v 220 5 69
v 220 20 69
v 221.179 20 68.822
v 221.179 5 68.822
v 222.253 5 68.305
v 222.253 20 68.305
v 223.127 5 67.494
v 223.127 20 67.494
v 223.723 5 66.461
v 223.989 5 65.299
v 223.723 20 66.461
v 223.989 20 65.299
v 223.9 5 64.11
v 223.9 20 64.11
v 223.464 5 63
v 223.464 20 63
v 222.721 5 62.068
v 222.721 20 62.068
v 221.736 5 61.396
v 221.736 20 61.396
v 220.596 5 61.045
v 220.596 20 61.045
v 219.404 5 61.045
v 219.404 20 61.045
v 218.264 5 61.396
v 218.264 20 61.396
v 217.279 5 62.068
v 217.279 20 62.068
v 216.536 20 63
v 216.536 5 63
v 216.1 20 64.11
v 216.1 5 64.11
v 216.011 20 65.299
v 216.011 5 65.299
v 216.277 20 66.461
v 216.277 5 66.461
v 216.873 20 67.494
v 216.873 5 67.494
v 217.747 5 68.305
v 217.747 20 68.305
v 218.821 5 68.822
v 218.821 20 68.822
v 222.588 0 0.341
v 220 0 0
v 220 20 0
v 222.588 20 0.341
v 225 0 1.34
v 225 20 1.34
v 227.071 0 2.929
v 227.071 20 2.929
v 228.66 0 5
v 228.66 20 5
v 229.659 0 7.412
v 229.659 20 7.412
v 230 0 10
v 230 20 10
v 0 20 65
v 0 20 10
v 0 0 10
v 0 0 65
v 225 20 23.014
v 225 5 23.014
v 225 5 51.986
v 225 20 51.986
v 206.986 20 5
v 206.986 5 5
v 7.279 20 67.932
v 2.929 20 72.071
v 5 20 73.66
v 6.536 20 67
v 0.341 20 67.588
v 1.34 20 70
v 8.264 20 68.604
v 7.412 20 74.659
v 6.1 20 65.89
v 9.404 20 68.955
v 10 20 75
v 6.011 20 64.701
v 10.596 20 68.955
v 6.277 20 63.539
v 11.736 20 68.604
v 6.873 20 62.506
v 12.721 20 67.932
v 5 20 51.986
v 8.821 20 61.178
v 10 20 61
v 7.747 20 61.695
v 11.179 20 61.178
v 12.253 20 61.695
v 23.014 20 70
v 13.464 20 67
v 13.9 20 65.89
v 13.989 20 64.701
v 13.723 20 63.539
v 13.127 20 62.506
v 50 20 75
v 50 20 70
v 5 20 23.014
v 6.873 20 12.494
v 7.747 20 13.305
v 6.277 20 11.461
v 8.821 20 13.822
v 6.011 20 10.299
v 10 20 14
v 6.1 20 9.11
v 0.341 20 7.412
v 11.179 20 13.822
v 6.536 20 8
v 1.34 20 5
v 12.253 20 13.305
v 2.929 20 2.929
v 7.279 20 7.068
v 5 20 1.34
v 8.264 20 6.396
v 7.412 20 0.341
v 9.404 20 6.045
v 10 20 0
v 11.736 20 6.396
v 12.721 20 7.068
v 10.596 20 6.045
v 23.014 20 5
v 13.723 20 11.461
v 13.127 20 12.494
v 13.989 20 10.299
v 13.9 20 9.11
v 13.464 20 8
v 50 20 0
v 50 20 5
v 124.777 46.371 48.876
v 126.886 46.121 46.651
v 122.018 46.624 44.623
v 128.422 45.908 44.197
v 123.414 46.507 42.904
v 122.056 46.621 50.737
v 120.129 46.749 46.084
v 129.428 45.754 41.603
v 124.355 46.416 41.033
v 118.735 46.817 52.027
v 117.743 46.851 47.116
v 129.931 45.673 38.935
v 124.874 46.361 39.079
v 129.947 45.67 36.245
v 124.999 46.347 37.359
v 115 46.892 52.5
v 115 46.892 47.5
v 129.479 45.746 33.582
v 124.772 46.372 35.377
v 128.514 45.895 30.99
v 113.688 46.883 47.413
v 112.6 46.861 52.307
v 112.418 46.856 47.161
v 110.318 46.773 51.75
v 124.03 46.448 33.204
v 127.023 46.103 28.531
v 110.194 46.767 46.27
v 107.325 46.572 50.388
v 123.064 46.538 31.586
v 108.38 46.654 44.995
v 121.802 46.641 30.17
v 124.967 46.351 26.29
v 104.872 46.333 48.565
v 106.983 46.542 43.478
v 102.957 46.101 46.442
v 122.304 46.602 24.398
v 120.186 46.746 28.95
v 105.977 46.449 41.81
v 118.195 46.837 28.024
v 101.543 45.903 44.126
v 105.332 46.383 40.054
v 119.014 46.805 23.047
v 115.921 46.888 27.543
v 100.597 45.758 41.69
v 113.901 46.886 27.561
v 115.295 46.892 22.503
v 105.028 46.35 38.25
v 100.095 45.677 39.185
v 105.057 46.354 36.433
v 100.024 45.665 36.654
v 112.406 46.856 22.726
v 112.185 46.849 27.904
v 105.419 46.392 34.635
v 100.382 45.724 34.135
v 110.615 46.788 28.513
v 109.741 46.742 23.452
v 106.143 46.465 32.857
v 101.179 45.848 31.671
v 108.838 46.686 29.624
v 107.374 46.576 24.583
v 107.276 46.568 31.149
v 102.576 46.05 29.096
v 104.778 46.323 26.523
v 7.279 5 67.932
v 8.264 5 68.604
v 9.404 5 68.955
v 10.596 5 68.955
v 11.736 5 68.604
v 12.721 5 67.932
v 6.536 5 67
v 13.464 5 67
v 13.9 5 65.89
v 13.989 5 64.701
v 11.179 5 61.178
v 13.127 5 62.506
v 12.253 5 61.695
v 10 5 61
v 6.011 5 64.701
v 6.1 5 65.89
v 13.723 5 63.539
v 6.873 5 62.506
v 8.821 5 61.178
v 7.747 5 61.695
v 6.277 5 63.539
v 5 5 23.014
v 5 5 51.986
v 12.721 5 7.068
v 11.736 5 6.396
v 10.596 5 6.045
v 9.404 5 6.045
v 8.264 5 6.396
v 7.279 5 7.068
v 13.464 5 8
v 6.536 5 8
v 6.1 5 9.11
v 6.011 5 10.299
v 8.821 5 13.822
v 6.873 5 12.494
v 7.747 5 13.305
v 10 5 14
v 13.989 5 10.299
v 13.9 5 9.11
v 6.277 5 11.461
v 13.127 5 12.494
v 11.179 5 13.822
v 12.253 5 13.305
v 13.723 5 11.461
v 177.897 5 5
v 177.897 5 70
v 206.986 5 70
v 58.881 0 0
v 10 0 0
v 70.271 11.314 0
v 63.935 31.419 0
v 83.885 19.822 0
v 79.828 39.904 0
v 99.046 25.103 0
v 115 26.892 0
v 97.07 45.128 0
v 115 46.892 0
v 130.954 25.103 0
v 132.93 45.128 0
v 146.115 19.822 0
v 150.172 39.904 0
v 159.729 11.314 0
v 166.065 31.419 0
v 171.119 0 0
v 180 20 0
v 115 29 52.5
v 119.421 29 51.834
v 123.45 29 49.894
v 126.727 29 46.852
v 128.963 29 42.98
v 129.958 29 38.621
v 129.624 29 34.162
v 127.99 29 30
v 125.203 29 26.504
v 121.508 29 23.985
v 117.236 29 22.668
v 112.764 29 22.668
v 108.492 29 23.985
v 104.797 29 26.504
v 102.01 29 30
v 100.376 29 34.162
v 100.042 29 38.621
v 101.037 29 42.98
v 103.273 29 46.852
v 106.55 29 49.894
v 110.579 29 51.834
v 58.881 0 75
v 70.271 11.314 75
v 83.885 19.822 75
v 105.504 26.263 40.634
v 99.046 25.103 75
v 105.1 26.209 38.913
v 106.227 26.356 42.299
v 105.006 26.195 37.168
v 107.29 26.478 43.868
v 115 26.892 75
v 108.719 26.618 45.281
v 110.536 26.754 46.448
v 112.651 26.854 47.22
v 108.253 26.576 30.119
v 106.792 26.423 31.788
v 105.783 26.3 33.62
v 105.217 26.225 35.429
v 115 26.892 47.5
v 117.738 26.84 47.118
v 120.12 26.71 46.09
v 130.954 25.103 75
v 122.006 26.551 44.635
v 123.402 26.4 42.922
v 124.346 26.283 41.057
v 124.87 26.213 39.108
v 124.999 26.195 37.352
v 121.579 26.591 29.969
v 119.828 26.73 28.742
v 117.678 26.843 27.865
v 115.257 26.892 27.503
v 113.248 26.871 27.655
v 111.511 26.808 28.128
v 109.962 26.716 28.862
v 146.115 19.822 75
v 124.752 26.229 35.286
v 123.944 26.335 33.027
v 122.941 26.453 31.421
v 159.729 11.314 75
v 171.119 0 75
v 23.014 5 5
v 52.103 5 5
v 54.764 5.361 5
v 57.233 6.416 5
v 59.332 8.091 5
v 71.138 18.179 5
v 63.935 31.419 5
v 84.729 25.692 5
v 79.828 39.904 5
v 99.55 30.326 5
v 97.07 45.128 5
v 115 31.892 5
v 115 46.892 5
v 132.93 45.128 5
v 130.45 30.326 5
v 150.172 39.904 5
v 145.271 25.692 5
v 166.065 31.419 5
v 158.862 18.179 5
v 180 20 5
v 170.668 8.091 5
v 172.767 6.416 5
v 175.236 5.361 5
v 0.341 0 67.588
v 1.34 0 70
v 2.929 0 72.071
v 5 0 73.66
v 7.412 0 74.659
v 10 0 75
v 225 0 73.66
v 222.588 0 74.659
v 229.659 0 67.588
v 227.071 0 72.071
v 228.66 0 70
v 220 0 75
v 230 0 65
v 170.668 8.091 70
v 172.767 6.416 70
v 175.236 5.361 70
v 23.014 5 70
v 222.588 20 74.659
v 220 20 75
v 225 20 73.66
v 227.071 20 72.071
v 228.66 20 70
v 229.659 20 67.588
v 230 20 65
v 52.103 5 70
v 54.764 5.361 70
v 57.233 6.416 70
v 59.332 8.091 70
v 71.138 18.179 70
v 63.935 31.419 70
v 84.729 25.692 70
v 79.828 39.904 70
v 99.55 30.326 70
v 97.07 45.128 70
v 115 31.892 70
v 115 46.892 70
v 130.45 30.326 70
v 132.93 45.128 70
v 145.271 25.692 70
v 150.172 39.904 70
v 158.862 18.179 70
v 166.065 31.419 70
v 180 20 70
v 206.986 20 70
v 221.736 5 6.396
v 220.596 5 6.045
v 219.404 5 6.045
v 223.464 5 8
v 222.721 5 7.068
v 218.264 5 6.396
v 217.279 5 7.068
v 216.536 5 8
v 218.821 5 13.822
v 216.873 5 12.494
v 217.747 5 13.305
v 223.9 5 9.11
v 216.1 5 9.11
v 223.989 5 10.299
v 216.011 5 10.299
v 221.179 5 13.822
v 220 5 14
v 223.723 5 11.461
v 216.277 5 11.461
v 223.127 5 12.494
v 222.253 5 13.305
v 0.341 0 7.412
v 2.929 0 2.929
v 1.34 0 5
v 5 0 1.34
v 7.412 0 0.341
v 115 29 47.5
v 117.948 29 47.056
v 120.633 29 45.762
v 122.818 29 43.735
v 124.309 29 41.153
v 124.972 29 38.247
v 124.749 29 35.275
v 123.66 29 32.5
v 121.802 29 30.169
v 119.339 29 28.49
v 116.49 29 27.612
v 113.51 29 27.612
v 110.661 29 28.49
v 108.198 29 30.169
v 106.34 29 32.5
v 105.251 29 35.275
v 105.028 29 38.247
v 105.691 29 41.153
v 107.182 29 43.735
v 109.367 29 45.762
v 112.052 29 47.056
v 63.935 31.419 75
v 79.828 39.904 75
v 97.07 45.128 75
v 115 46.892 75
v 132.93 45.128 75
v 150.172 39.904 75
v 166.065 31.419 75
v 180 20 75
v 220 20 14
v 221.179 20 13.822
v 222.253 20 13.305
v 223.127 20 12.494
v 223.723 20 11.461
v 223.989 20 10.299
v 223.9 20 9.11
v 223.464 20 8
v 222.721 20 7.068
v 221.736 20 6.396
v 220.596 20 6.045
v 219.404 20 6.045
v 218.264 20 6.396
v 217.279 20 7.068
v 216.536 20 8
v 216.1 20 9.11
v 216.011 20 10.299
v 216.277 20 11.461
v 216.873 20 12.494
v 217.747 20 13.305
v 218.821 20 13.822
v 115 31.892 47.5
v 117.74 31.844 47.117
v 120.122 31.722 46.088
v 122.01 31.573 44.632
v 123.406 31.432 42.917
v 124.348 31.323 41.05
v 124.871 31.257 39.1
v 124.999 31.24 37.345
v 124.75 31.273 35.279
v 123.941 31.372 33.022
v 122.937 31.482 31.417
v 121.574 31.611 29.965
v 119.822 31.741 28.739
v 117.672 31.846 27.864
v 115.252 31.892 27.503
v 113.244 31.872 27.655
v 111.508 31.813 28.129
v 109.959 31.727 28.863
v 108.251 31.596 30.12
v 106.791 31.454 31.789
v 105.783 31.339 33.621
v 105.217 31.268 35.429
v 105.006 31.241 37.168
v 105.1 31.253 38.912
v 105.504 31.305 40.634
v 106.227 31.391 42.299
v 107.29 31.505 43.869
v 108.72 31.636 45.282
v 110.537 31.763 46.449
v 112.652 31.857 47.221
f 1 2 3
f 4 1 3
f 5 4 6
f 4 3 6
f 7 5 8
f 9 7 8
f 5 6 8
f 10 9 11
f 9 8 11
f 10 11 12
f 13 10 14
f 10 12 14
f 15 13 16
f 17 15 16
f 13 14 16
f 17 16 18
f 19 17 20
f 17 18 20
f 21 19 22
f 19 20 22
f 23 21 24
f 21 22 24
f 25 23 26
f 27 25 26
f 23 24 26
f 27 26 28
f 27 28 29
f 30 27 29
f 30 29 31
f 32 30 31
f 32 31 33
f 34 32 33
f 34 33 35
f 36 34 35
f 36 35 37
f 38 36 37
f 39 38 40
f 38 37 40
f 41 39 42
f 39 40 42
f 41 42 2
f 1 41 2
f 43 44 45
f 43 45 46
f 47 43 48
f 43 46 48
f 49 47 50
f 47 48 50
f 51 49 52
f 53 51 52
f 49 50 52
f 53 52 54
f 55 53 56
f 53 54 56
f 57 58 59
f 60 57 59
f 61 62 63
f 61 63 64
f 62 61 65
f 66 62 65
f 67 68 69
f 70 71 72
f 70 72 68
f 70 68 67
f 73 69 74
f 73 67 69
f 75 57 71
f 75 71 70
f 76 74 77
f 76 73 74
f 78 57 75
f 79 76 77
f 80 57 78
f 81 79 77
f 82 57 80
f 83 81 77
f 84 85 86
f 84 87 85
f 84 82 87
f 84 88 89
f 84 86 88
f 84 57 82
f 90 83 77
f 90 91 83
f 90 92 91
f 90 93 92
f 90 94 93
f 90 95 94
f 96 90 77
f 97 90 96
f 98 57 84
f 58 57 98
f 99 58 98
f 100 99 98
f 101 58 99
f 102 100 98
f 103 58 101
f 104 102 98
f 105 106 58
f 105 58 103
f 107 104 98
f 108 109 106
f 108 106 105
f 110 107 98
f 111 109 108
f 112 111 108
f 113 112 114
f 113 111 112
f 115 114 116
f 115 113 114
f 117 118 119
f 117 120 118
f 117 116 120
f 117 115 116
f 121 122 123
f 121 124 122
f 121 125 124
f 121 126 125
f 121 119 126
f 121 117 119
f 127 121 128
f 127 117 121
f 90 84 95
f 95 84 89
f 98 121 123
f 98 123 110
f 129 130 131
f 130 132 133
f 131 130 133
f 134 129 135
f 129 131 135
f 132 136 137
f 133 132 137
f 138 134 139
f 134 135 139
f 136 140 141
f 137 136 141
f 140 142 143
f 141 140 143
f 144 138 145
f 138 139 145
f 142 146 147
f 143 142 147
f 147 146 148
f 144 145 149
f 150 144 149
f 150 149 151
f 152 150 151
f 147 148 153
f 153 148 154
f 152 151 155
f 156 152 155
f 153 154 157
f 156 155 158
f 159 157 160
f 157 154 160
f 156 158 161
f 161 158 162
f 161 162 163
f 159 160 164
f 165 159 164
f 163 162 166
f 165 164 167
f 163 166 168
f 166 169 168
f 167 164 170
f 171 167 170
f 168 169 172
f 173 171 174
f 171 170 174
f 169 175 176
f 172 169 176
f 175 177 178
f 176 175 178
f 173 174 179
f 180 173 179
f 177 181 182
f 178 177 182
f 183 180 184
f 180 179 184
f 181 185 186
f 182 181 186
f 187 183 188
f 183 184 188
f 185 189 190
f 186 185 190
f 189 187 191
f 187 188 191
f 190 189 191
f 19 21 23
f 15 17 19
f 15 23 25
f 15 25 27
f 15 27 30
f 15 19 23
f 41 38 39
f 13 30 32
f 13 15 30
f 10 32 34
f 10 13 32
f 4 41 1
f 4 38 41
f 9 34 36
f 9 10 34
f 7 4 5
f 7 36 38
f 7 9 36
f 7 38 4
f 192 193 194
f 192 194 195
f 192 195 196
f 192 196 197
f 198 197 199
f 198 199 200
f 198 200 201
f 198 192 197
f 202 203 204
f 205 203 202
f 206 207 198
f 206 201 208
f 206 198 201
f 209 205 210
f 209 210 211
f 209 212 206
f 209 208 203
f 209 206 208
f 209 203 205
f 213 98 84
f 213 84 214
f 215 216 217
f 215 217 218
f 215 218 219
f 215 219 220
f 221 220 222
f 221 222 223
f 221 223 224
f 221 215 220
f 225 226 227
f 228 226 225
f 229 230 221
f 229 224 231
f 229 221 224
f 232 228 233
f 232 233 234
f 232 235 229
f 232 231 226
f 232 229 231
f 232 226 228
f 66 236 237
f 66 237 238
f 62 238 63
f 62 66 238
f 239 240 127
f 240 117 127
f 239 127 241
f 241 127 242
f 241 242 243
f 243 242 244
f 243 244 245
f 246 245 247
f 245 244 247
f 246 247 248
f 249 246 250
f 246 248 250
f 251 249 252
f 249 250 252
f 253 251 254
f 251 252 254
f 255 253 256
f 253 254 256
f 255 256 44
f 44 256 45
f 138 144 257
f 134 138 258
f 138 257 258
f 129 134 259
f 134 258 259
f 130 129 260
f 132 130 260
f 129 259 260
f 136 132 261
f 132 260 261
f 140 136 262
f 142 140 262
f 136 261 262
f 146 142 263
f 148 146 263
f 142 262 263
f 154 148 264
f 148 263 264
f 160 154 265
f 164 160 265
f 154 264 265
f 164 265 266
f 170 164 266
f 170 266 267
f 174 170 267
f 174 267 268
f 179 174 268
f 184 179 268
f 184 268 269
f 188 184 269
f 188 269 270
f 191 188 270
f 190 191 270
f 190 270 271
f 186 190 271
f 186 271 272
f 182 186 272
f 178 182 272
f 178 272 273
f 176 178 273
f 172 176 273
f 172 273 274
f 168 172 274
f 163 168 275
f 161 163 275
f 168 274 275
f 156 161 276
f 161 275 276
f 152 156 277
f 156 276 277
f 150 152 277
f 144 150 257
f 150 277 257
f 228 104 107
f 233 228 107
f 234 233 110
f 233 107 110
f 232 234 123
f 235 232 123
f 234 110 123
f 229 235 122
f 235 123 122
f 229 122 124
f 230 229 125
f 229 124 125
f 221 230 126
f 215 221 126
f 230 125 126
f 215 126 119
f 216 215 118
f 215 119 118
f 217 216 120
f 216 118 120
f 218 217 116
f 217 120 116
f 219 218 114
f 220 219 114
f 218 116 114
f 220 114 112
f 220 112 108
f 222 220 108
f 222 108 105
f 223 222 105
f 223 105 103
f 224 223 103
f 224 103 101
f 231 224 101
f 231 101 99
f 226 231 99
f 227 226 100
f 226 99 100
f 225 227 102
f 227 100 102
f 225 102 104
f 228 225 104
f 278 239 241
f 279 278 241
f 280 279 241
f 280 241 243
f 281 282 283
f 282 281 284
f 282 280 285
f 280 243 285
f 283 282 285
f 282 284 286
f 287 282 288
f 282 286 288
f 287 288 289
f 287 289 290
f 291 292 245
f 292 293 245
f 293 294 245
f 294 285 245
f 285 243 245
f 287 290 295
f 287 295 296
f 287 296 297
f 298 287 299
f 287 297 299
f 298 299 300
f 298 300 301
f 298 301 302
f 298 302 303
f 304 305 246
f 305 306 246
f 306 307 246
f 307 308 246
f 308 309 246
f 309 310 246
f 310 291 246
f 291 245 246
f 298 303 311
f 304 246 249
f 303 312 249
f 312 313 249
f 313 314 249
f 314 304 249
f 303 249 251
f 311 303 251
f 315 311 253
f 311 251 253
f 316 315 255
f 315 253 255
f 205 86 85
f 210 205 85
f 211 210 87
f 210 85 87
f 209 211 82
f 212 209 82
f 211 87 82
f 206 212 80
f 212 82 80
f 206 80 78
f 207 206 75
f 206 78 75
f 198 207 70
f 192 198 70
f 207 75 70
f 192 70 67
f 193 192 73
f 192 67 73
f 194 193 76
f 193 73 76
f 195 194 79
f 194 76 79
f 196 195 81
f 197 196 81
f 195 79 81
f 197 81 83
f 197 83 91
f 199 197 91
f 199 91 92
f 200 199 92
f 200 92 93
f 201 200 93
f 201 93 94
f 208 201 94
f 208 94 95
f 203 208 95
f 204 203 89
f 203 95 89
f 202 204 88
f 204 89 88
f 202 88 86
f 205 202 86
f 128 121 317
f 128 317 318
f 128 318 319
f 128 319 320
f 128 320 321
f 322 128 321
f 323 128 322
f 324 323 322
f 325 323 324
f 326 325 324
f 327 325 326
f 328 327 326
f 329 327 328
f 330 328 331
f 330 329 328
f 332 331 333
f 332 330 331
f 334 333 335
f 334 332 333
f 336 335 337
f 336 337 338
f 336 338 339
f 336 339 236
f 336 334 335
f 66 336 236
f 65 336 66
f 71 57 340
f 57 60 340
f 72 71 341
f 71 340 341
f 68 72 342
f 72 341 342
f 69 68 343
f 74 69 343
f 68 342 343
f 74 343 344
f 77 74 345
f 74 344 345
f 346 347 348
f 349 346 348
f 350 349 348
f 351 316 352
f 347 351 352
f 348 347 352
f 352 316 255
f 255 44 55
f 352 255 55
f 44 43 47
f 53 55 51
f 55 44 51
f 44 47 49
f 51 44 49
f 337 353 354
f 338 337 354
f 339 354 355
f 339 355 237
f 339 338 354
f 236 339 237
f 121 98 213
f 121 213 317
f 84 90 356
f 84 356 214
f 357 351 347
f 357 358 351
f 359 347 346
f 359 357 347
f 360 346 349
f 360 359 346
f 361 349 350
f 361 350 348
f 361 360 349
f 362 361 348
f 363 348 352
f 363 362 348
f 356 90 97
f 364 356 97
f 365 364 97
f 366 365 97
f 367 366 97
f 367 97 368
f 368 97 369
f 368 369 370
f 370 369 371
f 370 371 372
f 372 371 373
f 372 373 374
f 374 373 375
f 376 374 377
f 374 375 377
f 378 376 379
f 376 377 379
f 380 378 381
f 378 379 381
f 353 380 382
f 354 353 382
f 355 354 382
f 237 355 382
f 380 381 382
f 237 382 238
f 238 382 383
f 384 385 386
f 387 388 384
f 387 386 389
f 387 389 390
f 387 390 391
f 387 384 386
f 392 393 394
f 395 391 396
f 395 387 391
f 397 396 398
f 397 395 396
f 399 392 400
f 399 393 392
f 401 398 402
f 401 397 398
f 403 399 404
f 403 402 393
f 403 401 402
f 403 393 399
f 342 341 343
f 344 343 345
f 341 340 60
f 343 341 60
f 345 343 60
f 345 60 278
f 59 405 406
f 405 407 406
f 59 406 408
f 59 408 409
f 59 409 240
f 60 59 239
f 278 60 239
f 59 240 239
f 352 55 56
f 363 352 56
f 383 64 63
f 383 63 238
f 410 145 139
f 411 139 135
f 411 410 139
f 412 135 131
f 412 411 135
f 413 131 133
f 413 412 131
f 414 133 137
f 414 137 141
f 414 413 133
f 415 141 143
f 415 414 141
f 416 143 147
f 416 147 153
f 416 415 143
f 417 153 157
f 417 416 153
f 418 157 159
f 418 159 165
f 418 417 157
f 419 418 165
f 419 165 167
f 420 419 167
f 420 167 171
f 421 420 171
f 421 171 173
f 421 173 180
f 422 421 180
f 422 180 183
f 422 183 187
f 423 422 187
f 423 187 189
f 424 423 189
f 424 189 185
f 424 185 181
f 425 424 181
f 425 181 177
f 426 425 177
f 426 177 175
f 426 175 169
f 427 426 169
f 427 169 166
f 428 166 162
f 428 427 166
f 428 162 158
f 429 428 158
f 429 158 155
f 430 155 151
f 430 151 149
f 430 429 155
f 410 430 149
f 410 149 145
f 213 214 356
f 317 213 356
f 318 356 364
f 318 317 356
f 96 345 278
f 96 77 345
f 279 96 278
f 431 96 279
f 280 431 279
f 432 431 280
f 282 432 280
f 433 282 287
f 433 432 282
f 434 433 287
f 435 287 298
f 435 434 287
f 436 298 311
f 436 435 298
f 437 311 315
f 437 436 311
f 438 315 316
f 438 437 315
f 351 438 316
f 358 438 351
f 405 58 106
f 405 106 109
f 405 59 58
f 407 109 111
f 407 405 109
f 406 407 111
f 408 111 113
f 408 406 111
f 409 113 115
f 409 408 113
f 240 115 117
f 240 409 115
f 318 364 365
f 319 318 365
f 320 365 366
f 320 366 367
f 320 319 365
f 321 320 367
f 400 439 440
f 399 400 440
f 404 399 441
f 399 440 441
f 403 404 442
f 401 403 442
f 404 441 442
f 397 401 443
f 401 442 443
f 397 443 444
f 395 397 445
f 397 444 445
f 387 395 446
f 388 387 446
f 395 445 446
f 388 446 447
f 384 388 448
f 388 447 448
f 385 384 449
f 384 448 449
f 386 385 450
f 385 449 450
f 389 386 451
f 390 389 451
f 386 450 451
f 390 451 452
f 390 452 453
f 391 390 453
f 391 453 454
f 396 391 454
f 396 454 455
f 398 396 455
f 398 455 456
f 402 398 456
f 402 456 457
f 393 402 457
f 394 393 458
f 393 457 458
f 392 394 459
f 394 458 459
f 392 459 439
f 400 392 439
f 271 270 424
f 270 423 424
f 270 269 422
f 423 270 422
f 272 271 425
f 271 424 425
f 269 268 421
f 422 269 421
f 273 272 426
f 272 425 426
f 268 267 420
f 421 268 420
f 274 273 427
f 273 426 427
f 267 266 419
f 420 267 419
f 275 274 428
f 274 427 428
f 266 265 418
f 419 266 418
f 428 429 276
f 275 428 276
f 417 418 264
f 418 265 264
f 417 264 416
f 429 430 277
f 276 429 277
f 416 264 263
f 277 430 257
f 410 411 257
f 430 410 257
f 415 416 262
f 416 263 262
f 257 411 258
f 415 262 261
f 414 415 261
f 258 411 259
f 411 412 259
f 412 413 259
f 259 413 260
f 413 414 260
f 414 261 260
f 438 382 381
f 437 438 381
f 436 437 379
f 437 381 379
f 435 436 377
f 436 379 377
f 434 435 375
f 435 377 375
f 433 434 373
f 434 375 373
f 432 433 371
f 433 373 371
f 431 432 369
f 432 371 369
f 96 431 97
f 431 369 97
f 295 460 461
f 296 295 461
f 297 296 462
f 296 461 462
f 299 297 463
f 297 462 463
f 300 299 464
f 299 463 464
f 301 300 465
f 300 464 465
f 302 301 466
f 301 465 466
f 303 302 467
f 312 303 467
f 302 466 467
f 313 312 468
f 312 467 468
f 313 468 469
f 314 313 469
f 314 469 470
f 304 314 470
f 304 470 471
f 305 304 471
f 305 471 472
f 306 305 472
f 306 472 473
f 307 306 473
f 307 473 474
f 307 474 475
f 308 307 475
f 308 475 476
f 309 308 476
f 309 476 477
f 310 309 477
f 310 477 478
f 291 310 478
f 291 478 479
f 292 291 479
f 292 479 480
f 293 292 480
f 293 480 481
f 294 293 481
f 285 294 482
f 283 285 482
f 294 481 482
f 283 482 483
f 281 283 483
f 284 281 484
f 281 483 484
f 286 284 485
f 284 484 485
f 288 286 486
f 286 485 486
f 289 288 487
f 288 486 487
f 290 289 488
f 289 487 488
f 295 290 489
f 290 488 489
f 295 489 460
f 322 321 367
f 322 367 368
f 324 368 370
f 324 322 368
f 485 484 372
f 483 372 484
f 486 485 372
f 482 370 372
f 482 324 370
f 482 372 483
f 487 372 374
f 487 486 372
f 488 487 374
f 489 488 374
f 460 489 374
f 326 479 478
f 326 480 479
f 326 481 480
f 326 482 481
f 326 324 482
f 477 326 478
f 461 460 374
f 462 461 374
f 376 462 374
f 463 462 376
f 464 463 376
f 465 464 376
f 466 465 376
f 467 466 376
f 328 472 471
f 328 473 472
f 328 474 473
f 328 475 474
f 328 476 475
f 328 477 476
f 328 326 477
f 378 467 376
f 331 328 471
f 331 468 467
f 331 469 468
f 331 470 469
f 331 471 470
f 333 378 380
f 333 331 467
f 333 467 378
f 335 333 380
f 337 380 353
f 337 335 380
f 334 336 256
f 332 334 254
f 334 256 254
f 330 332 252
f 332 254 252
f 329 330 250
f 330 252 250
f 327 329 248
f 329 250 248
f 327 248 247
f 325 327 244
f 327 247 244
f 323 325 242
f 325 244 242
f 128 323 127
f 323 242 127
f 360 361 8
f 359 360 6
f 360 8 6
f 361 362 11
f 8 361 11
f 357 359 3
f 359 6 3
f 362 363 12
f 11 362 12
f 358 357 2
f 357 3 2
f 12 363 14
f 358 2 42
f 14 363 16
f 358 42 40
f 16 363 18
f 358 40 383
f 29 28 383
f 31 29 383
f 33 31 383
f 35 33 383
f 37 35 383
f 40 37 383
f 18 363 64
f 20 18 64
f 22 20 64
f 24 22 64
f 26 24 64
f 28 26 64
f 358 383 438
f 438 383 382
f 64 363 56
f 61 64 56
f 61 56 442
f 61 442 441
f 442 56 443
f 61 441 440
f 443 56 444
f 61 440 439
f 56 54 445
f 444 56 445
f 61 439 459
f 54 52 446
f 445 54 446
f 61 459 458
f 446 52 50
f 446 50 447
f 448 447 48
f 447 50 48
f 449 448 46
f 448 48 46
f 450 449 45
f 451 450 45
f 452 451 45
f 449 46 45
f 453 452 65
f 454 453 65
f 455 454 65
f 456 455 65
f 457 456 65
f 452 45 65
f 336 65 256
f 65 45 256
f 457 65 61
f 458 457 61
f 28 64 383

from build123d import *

# Parameters (mm, degrees)
EXTRUDE_1_DEPTH          = 75
SHELL_1_T                = -5
FILLET_1_R               = 10
EXTRUDE_2_DEPTH          = 20
FILLET_2_R               = 10
EXTRUDE_3_DEPTH          = 20
SKETCH_5_R               = 4
CUT_EXTRUDE_1_DEPTH      = 15
EXTRUDE_4_DEPTH          = 15
EXTRUDE_4_DEPTH_BACK     = 5
SKETCH_6_R               = 15
SKETCH_6_R_2             = 10
SKETCH_6_3_R             = 10
CUT_EXTRUDE_2_DEPTH      = 15
CUT_EXTRUDE_3_DEPTH      = 247.831926653
CUT_EXTRUDE_3_DEPTH_BACK = 274


with BuildPart() as part:
    # 스케치2 → 보스-돌출1 (new body)
    with BuildSketch(Plane.XY):
        with BuildLine():
            Line((0, 0), (58.881338846, 0))
            ThreePointArc((58.881338846, 0), (115, 26.892396757), (171.118661154, 0))
            Line((171.118661154, 0), (230, 0))
            Line((230, 0), (230, 20))
            Line((230, 20), (180, 20))
            ThreePointArc((180, 20), (115, 46.892396757), (50, 20))
            Line((50, 20), (0, 20))
            Line((0, 20), (0, 0))
        make_face()
    extrude(amount=EXTRUDE_1_DEPTH)

    # 쉘1
    shell_1_openings = [part.faces().sort_by_distance(p)[0] for p in [
        (205, 20, 37.5),
        (115, 46.892396757, 37.5),
        (25, 20, 37.5),
    ]]
    offset(amount=SHELL_1_T, openings=shell_1_openings, kind=Kind.INTERSECTION)

    # 필렛1
    fillet_1_edges = [part.edges().sort_by_distance(p)[0] for p in [
        (173.465614657, 5, 37.5),
        (56.534385343, 5, 37.5),
    ]]
    fillet(fillet_1_edges, radius=FILLET_1_R)

    # 스케치3 → 보스-돌출2 (add)
    with BuildSketch(Plane(origin=(0, 20, 0), x_dir=(1, 0, 0), z_dir=(0, 1, 0))):
        Polygon((5, -5), (5, -23.013509492), (23.013509492, -5), align=None)
        Polygon((23.013509492, -70), (5, -51.986490508), (5, -70), align=None)
    extrude(amount=-EXTRUDE_2_DEPTH)

    # 필렛2
    fillet_2_edges = [part.edges().sort_by_distance(p)[0] for p in [
        (230, 10, 0),
        (230, 10, 75),
        (0, 10, 0),
        (0, 10, 75),
    ]]
    fillet(fillet_2_edges, radius=FILLET_2_R)

    # 스케치3<3> → 보스-돌출3 (add)
    with BuildSketch(Plane(origin=(0, 20, 0), x_dir=(1, 0, 0), z_dir=(0, 1, 0))):
        Polygon((206.986490508, -5), (225, -23.013509492), (225, -5), align=None)
        Polygon((206.986490508, -70), (225, -70), (225, -51.986490508), align=None)
    extrude(amount=-EXTRUDE_3_DEPTH)

    # 스케치5 → 컷-돌출1 (cut)
    with BuildSketch(Plane(origin=(0, 20, 0), x_dir=(1, 0, 0), z_dir=(0, 1, 0))):
        with Locations((10, -10)):
            Circle(SKETCH_5_R)
        with Locations((10, -65)):
            Circle(SKETCH_5_R)
        with Locations((220, -65)):
            Circle(SKETCH_5_R)
        with Locations((220, -10)):
            Circle(SKETCH_5_R)
    extrude(amount=-CUT_EXTRUDE_1_DEPTH, mode=Mode.SUBTRACT)

    # 스케치6<3> → 컷-돌출2 (cut)
    with BuildSketch(Plane(origin=(0, 34, 0), x_dir=(1, 0, 0), z_dir=(0, 1, 0))):
        with Locations((115, -37.5)):
            Circle(SKETCH_6_3_R)
    extrude(amount=-CUT_EXTRUDE_2_DEPTH, mode=Mode.SUBTRACT)


with BuildPart() as body_2:
    # 스케치6 → 보스-돌출4 (new, two sides: drawn at the far end of the back side and taken through both)
    with BuildSketch(Plane(origin=(0, 34, 0), x_dir=(1, 0, 0), z_dir=(0, 1, 0)).offset(-EXTRUDE_4_DEPTH_BACK)):
        with Locations((115, -37.5)):
            Circle(SKETCH_6_R)
        with Locations((115, -37.5)):
            Circle(SKETCH_6_R_2, mode=Mode.SUBTRACT)
    extrude(amount=EXTRUDE_4_DEPTH + EXTRUDE_4_DEPTH_BACK)

    # 스케치7 → 컷-돌출3 (cut, two sides: drawn at the far end of the back side and taken through both)
    with BuildSketch(Plane.XY.offset(75).offset(-CUT_EXTRUDE_3_DEPTH_BACK)):
        with BuildLine():
            Line((50, 85.485358055), (50, 20))
            ThreePointArc((50, 20), (115, 46.892396757), (180, 20))
            Line((180, 20), (180, 85.485358055))
            Line((180, 85.485358055), (50, 85.485358055))
        make_face()
    extrude(amount=CUT_EXTRUDE_3_DEPTH + CUT_EXTRUDE_3_DEPTH_BACK, mode=Mode.SUBTRACT)


solid = Compound([part.part, body_2.part])
